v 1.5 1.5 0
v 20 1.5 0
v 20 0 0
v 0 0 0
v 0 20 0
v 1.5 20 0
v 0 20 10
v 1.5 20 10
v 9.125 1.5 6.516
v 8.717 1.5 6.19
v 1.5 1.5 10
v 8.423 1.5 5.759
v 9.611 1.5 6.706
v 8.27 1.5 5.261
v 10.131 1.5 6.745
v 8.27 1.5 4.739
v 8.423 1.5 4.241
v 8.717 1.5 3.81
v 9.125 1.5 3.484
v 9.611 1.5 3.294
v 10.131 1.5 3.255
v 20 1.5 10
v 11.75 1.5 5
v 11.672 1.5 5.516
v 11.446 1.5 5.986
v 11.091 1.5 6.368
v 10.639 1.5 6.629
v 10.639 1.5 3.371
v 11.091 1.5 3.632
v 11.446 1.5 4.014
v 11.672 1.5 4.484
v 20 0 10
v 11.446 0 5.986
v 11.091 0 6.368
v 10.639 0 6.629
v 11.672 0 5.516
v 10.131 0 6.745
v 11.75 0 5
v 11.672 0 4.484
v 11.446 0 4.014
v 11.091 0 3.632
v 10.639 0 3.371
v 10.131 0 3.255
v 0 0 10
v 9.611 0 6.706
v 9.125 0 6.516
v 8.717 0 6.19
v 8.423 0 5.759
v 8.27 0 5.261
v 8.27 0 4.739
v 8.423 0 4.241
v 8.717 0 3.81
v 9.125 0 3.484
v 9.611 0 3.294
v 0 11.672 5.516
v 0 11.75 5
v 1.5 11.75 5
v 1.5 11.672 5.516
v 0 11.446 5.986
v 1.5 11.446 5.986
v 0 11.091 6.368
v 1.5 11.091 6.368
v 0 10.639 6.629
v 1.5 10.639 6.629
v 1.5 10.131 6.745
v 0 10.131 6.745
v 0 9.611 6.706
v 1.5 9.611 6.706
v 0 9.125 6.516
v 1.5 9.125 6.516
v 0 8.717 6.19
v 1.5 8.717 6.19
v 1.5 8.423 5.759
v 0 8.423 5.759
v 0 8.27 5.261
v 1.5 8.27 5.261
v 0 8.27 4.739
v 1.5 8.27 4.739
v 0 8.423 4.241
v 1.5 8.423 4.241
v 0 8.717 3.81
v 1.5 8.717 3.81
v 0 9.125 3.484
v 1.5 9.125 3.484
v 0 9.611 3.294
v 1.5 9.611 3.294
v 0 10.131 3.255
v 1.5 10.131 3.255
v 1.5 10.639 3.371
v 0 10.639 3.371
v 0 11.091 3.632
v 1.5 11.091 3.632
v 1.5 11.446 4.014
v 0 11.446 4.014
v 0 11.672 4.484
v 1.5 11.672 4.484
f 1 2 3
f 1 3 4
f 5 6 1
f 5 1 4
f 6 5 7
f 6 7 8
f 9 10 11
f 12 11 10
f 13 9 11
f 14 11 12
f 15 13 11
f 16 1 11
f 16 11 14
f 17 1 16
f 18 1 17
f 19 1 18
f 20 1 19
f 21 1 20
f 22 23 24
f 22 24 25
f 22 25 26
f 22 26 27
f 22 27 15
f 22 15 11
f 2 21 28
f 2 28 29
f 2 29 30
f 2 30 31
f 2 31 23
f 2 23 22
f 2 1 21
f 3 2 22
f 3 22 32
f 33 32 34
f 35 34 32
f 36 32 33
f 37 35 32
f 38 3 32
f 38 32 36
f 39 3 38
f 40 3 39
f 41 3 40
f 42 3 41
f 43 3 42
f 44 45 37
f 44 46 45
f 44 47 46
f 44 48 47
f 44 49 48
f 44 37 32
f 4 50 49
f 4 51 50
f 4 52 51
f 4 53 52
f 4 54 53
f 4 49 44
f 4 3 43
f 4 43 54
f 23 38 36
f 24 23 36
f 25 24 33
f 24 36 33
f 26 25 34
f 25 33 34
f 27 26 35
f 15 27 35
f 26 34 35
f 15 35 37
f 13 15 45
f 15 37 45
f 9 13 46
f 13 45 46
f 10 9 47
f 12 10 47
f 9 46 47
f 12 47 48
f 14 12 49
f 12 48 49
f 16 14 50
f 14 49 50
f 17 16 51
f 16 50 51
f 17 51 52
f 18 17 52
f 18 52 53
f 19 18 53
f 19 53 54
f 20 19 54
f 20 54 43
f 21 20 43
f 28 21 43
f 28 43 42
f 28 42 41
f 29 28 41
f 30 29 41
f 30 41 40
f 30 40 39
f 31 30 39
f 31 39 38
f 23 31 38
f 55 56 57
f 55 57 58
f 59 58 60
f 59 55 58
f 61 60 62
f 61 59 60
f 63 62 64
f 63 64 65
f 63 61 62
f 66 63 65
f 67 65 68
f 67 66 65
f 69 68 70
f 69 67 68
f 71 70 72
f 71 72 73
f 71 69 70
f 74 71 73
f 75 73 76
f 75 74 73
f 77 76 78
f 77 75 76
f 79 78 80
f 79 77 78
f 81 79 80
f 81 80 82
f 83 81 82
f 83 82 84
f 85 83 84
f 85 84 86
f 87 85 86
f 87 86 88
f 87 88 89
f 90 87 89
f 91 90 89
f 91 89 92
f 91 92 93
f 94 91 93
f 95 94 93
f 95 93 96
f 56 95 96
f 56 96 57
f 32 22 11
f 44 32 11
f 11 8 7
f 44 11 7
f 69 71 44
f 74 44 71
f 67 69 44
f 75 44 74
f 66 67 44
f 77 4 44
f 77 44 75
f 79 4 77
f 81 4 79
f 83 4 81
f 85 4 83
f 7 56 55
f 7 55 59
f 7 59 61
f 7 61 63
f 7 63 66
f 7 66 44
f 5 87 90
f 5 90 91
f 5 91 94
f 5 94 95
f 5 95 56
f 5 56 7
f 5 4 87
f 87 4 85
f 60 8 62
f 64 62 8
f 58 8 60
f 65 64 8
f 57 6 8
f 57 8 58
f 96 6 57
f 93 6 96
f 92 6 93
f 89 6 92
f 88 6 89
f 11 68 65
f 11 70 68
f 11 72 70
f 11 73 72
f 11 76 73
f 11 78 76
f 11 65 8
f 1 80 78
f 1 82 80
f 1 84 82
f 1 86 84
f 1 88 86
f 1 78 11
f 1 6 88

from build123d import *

# Parameters (mm, degrees)
EXTRUDE_1_DEPTH     = 10
CUT_EXTRUDE_1_REACH = 32
SKETCH_3_R          = 1.75


with BuildPart() as part:
    # Эскиз2 → Бобышка-Вытянуть1 (new body)
    with BuildSketch(Plane.XY):
        Polygon((0, 0), (0, 20), (1.5, 20), (1.5, 1.5), (20, 1.5), (20, 0), align=None)
    extrude(amount=EXTRUDE_1_DEPTH)

    # Эскиз3 → Вырез-Вытянуть1 (cut, up to next)
    with BuildSketch(Plane.XZ, mode=Mode.PRIVATE) as cut_extrude_1_sk1:
        with Locations((10, 5)):
            Circle(SKETCH_3_R)
    cut_extrude_1_tool1 = extrude(cut_extrude_1_sk1.sketch, amount=-CUT_EXTRUDE_1_REACH, mode=Mode.PRIVATE) & part.part
    cut_extrude_1 = cut_extrude_1_tool1.solids().sort_by_distance((10, 0, 5))[0]
    add(cut_extrude_1, mode=Mode.SUBTRACT)

    # Зеркальное отражение1: Вырез-Вытянуть1 across plane
    add(cut_extrude_1.mirror(Plane(origin=(0, 0, 0), x_dir=(0, 0, 1), z_dir=(-0.7071067811865471, 0.7071067811865479, 0))), mode=Mode.SUBTRACT)


solid = part.part
